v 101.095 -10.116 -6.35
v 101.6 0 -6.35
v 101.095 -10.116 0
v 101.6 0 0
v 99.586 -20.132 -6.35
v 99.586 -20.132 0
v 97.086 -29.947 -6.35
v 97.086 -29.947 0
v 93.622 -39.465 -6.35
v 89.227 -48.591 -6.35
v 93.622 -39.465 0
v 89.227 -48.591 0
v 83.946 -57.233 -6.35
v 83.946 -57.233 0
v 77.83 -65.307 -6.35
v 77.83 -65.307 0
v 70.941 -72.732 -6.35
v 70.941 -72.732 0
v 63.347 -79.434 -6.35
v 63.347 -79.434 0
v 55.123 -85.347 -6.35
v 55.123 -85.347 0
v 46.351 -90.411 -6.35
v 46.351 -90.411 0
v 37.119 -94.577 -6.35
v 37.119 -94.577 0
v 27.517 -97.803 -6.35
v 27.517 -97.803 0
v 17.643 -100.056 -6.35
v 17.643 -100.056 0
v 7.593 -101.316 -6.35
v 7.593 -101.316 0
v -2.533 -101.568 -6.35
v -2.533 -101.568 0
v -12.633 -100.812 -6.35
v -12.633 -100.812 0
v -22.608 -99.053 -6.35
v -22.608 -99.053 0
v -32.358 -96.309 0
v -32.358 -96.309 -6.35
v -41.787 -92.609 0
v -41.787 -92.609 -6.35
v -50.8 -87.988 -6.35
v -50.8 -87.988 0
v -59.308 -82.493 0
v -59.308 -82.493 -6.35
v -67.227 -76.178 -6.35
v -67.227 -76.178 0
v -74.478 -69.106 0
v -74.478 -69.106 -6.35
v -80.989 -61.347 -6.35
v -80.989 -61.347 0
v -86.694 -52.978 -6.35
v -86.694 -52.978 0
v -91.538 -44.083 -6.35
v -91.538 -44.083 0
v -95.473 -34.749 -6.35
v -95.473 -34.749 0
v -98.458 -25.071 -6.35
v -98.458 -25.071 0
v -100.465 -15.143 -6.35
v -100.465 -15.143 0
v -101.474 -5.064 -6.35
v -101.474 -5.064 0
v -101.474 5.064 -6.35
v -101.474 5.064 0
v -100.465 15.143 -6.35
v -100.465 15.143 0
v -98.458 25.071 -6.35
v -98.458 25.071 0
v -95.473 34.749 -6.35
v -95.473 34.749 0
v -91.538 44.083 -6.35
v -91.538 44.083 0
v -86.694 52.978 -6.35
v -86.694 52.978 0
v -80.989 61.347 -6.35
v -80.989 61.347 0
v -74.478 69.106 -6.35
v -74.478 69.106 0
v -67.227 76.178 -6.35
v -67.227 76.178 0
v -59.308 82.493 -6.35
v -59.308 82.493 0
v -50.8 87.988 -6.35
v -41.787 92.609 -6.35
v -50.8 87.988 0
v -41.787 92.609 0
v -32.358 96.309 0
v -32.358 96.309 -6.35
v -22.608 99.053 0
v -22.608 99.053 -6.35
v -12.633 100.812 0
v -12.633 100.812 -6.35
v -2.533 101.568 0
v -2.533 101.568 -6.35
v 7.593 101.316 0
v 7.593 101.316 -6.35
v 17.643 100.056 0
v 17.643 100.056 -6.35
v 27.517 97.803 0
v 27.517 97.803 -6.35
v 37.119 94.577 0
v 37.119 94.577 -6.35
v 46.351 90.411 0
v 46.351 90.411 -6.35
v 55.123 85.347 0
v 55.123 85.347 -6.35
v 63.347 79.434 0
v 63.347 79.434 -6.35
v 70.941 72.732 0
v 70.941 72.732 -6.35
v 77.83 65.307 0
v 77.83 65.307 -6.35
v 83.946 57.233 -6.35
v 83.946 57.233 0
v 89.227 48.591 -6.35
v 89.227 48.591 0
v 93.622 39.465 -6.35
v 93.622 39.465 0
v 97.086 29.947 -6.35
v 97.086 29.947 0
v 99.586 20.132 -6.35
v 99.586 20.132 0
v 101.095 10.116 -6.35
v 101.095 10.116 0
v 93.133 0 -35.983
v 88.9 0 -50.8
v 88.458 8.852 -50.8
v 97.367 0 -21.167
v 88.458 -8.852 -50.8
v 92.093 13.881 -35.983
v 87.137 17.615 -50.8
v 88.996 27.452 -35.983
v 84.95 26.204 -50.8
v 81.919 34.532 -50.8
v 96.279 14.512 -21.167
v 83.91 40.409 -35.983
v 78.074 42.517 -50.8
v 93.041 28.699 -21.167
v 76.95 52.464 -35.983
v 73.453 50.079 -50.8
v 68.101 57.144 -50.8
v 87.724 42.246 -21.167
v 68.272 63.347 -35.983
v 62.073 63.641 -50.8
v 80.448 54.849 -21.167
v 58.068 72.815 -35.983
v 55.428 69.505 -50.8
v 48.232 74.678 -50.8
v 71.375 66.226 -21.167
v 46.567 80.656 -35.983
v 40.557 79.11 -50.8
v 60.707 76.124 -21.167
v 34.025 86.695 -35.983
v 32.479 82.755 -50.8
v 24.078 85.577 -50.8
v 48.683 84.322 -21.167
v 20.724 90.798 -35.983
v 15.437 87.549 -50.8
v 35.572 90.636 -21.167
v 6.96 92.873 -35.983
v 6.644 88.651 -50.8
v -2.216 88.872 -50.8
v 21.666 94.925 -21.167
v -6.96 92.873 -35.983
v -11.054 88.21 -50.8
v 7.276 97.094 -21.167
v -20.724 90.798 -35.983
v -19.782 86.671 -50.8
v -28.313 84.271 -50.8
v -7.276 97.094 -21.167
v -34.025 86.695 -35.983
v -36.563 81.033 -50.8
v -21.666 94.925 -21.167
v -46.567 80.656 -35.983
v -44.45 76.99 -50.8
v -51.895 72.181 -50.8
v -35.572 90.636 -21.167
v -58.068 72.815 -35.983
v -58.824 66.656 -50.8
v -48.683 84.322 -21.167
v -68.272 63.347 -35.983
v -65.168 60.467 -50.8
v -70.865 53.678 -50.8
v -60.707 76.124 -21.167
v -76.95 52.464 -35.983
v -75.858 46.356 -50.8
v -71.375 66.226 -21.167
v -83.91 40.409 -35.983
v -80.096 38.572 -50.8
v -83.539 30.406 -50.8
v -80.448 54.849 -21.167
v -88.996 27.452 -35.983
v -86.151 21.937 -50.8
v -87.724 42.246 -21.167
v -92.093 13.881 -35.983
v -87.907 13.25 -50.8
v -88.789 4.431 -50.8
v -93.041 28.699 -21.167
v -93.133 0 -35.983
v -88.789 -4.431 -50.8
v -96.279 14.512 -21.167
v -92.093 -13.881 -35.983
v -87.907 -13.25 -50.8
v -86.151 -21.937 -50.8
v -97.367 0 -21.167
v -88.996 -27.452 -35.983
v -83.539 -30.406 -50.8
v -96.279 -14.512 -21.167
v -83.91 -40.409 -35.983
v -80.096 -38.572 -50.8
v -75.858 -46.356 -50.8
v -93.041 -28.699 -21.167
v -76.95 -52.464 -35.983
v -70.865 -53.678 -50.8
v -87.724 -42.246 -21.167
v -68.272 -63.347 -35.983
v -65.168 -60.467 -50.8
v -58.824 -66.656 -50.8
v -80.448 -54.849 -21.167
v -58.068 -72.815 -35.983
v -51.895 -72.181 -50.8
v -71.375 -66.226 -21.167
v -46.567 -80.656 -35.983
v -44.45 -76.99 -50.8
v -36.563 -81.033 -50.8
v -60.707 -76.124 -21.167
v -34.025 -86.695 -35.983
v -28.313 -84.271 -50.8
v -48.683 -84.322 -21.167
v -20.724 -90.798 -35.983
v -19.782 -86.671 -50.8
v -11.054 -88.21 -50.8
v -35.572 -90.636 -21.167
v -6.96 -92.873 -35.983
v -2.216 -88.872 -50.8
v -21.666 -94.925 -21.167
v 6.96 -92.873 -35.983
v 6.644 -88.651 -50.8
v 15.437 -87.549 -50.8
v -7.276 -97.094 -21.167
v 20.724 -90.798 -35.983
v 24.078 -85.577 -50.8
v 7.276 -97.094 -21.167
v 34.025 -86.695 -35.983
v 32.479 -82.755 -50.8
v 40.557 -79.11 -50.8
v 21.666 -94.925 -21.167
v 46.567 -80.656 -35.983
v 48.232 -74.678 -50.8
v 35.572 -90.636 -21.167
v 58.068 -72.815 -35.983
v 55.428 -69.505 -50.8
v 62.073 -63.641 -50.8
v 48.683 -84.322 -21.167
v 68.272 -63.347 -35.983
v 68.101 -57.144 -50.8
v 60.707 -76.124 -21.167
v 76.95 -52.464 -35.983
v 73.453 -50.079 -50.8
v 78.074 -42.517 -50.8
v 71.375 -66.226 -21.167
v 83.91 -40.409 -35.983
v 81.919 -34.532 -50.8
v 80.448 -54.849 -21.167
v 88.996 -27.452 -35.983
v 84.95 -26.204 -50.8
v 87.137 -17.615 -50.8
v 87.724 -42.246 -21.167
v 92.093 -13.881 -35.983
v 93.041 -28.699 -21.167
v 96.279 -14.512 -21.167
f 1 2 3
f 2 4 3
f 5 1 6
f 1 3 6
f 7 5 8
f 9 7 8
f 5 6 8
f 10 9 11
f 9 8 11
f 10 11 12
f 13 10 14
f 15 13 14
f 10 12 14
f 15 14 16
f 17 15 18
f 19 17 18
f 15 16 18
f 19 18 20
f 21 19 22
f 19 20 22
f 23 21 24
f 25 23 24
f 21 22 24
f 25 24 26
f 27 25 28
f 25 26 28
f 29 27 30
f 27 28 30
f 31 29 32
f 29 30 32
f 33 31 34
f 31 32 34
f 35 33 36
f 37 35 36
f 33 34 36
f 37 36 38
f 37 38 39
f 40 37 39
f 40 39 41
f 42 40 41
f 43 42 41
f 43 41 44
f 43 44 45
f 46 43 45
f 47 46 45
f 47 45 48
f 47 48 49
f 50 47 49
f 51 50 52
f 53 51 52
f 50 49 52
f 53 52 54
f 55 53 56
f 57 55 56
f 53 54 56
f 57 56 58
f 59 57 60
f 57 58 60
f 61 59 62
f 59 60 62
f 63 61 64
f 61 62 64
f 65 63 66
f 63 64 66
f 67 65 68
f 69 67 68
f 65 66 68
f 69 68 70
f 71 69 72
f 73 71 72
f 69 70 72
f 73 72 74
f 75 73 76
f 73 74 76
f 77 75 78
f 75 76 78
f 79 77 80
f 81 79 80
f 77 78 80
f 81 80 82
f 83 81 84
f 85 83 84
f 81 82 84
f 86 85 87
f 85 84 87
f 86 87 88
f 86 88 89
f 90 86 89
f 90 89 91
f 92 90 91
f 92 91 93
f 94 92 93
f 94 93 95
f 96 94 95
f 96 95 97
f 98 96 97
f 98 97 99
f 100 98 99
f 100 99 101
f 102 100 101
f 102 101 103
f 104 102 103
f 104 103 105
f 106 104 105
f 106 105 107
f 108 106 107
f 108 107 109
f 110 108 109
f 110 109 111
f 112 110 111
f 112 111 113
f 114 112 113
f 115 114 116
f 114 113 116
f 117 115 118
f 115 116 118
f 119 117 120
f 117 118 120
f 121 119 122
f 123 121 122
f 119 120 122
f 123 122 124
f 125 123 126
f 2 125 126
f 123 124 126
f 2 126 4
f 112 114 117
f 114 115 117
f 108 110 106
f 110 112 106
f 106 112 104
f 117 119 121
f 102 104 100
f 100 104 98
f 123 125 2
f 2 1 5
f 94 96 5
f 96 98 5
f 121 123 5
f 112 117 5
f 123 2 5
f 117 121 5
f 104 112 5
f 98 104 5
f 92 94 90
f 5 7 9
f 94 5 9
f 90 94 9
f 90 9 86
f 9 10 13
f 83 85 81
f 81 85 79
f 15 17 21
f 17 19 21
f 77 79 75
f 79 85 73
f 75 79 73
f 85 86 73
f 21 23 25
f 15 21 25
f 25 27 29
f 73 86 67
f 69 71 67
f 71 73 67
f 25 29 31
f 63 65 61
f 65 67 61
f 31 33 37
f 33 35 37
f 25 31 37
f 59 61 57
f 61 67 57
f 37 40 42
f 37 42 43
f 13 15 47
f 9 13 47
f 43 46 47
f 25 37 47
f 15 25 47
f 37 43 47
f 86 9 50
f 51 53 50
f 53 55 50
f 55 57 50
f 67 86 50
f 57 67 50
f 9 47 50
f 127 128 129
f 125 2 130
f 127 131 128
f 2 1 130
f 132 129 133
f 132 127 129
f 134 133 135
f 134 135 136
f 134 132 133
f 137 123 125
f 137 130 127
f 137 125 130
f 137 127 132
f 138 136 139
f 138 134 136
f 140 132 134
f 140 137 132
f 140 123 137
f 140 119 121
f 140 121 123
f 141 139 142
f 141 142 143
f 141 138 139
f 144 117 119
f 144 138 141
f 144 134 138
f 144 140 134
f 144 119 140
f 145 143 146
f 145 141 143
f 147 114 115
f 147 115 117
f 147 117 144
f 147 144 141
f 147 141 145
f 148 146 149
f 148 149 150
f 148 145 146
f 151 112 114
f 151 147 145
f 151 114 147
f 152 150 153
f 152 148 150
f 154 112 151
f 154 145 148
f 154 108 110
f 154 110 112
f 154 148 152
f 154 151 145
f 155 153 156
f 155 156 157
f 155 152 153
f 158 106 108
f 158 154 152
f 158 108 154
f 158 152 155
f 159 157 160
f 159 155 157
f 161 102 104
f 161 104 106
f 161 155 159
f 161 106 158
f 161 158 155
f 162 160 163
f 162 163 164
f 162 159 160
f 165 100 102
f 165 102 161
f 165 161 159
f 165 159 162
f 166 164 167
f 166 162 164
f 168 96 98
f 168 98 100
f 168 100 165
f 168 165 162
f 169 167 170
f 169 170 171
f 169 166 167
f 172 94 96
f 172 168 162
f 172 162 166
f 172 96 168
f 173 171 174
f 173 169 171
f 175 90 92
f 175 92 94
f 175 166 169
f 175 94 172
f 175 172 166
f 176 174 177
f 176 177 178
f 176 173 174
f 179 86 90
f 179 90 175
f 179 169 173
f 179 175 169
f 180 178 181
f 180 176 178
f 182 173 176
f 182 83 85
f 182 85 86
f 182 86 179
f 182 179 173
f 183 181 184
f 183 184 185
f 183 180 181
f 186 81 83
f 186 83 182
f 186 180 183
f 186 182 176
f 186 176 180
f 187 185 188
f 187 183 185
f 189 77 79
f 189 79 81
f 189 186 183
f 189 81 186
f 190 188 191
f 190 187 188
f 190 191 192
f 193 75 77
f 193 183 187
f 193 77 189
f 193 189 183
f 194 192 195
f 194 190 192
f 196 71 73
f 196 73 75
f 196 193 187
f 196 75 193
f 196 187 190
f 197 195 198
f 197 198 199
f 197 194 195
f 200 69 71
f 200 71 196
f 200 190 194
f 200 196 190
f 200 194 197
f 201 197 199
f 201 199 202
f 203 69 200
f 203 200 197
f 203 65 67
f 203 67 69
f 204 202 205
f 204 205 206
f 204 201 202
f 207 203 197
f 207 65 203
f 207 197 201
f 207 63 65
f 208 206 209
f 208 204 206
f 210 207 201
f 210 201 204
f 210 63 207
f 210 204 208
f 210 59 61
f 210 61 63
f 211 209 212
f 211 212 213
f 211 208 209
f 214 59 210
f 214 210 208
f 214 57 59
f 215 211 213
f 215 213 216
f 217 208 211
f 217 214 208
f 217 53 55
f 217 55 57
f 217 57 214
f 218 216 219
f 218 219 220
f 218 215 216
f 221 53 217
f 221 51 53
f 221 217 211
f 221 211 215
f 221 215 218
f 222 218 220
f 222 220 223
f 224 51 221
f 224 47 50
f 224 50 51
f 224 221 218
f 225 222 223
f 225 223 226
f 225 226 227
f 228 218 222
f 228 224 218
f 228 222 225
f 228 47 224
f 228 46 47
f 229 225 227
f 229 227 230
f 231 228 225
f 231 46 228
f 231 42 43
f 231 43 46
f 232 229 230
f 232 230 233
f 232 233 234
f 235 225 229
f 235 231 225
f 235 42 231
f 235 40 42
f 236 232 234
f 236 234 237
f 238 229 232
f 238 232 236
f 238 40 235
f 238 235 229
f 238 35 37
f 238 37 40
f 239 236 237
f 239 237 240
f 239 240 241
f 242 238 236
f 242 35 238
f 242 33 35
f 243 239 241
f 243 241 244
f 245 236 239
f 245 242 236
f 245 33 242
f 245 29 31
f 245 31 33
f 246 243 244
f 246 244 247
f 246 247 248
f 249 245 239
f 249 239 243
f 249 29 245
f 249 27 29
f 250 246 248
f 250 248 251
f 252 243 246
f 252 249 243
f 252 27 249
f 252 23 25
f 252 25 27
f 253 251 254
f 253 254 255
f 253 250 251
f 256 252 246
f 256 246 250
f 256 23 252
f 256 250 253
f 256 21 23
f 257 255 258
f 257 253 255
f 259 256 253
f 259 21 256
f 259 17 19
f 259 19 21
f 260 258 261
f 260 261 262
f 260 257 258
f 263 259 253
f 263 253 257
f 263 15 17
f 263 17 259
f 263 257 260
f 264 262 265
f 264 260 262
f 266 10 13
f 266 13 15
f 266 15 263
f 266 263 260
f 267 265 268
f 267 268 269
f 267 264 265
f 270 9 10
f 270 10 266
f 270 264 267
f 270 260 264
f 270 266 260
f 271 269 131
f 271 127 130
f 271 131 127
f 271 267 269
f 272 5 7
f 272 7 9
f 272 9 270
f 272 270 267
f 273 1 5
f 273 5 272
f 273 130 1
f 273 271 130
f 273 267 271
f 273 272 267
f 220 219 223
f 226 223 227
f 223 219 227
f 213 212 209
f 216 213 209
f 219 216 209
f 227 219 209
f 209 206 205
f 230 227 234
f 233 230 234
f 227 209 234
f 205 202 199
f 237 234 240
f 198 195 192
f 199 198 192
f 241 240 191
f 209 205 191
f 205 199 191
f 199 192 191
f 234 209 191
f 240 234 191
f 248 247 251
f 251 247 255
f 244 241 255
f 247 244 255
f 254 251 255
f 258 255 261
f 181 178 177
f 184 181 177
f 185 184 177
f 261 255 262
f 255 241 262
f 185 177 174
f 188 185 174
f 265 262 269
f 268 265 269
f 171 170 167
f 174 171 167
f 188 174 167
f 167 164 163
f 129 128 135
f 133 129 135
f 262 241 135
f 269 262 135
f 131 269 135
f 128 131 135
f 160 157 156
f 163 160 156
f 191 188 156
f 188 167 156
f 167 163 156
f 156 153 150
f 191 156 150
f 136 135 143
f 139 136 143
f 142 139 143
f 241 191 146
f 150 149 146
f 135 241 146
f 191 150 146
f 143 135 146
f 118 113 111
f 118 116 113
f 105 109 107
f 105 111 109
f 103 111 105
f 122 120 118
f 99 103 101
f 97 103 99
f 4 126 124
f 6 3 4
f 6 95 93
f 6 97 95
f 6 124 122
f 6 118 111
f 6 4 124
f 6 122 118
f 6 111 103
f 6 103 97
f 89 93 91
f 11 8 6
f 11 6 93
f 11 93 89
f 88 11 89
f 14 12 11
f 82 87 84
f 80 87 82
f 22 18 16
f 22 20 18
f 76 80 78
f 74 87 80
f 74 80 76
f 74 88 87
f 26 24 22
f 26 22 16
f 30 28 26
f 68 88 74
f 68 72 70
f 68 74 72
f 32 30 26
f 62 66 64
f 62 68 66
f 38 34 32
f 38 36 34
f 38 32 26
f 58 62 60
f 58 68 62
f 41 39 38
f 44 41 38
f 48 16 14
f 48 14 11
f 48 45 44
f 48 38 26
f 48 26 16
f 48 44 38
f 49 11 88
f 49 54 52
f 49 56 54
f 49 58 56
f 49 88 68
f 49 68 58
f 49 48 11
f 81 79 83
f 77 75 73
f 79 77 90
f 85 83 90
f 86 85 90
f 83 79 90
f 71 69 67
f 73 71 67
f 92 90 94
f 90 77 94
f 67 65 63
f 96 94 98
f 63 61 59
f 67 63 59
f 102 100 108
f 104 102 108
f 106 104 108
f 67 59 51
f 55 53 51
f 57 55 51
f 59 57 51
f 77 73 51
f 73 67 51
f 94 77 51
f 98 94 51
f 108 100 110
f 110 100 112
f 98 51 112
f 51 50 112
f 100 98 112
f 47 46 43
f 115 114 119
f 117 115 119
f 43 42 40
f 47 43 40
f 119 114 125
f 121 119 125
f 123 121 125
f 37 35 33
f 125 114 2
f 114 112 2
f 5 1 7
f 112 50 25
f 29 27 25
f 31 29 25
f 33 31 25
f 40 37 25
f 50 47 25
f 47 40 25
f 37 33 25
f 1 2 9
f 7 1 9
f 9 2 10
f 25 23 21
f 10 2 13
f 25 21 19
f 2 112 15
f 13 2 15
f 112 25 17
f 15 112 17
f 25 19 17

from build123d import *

# Parameters (mm, degrees)
F0_W      = 101.6
F0_H      = 6.35
F2_W      = 88.9
F2_H      = 8.930966
F3_FACE_R = 88.9
F1_FACE_R = 101.6


with BuildPart() as f1:
    # F0 (on Front) → F1 (revolve)
    with BuildSketch(Plane.XZ):
        with Locations((50.8, -3.175)):
            Rectangle(F0_W, F0_H)
    revolve(axis=Axis((0, 0, -3.175), (0, 0, -1)))


with BuildPart() as f3:
    # F2 (on Front) → F3 (revolve)
    with BuildSketch(Plane.XZ):
        with Locations((44.45, -55.265483)):
            Rectangle(F2_W, F2_H)
    revolve(axis=Axis((0, 0, -55.265483), (0, 0, 1)))


with BuildPart() as f4:
    # F3_face (on face) → F4 section 0
    with BuildSketch(Plane.XY.offset(-50.8)):
        Circle(F3_FACE_R)
    # F1_face (on face) → F4 section 1
    with BuildSketch(Plane(origin=(0, 0, -6.35), x_dir=(1, 0, 0), z_dir=(0, 0, -1))):
        Circle(F1_FACE_R)
    loft()


solid = Compound([f1.part, f4.part])
